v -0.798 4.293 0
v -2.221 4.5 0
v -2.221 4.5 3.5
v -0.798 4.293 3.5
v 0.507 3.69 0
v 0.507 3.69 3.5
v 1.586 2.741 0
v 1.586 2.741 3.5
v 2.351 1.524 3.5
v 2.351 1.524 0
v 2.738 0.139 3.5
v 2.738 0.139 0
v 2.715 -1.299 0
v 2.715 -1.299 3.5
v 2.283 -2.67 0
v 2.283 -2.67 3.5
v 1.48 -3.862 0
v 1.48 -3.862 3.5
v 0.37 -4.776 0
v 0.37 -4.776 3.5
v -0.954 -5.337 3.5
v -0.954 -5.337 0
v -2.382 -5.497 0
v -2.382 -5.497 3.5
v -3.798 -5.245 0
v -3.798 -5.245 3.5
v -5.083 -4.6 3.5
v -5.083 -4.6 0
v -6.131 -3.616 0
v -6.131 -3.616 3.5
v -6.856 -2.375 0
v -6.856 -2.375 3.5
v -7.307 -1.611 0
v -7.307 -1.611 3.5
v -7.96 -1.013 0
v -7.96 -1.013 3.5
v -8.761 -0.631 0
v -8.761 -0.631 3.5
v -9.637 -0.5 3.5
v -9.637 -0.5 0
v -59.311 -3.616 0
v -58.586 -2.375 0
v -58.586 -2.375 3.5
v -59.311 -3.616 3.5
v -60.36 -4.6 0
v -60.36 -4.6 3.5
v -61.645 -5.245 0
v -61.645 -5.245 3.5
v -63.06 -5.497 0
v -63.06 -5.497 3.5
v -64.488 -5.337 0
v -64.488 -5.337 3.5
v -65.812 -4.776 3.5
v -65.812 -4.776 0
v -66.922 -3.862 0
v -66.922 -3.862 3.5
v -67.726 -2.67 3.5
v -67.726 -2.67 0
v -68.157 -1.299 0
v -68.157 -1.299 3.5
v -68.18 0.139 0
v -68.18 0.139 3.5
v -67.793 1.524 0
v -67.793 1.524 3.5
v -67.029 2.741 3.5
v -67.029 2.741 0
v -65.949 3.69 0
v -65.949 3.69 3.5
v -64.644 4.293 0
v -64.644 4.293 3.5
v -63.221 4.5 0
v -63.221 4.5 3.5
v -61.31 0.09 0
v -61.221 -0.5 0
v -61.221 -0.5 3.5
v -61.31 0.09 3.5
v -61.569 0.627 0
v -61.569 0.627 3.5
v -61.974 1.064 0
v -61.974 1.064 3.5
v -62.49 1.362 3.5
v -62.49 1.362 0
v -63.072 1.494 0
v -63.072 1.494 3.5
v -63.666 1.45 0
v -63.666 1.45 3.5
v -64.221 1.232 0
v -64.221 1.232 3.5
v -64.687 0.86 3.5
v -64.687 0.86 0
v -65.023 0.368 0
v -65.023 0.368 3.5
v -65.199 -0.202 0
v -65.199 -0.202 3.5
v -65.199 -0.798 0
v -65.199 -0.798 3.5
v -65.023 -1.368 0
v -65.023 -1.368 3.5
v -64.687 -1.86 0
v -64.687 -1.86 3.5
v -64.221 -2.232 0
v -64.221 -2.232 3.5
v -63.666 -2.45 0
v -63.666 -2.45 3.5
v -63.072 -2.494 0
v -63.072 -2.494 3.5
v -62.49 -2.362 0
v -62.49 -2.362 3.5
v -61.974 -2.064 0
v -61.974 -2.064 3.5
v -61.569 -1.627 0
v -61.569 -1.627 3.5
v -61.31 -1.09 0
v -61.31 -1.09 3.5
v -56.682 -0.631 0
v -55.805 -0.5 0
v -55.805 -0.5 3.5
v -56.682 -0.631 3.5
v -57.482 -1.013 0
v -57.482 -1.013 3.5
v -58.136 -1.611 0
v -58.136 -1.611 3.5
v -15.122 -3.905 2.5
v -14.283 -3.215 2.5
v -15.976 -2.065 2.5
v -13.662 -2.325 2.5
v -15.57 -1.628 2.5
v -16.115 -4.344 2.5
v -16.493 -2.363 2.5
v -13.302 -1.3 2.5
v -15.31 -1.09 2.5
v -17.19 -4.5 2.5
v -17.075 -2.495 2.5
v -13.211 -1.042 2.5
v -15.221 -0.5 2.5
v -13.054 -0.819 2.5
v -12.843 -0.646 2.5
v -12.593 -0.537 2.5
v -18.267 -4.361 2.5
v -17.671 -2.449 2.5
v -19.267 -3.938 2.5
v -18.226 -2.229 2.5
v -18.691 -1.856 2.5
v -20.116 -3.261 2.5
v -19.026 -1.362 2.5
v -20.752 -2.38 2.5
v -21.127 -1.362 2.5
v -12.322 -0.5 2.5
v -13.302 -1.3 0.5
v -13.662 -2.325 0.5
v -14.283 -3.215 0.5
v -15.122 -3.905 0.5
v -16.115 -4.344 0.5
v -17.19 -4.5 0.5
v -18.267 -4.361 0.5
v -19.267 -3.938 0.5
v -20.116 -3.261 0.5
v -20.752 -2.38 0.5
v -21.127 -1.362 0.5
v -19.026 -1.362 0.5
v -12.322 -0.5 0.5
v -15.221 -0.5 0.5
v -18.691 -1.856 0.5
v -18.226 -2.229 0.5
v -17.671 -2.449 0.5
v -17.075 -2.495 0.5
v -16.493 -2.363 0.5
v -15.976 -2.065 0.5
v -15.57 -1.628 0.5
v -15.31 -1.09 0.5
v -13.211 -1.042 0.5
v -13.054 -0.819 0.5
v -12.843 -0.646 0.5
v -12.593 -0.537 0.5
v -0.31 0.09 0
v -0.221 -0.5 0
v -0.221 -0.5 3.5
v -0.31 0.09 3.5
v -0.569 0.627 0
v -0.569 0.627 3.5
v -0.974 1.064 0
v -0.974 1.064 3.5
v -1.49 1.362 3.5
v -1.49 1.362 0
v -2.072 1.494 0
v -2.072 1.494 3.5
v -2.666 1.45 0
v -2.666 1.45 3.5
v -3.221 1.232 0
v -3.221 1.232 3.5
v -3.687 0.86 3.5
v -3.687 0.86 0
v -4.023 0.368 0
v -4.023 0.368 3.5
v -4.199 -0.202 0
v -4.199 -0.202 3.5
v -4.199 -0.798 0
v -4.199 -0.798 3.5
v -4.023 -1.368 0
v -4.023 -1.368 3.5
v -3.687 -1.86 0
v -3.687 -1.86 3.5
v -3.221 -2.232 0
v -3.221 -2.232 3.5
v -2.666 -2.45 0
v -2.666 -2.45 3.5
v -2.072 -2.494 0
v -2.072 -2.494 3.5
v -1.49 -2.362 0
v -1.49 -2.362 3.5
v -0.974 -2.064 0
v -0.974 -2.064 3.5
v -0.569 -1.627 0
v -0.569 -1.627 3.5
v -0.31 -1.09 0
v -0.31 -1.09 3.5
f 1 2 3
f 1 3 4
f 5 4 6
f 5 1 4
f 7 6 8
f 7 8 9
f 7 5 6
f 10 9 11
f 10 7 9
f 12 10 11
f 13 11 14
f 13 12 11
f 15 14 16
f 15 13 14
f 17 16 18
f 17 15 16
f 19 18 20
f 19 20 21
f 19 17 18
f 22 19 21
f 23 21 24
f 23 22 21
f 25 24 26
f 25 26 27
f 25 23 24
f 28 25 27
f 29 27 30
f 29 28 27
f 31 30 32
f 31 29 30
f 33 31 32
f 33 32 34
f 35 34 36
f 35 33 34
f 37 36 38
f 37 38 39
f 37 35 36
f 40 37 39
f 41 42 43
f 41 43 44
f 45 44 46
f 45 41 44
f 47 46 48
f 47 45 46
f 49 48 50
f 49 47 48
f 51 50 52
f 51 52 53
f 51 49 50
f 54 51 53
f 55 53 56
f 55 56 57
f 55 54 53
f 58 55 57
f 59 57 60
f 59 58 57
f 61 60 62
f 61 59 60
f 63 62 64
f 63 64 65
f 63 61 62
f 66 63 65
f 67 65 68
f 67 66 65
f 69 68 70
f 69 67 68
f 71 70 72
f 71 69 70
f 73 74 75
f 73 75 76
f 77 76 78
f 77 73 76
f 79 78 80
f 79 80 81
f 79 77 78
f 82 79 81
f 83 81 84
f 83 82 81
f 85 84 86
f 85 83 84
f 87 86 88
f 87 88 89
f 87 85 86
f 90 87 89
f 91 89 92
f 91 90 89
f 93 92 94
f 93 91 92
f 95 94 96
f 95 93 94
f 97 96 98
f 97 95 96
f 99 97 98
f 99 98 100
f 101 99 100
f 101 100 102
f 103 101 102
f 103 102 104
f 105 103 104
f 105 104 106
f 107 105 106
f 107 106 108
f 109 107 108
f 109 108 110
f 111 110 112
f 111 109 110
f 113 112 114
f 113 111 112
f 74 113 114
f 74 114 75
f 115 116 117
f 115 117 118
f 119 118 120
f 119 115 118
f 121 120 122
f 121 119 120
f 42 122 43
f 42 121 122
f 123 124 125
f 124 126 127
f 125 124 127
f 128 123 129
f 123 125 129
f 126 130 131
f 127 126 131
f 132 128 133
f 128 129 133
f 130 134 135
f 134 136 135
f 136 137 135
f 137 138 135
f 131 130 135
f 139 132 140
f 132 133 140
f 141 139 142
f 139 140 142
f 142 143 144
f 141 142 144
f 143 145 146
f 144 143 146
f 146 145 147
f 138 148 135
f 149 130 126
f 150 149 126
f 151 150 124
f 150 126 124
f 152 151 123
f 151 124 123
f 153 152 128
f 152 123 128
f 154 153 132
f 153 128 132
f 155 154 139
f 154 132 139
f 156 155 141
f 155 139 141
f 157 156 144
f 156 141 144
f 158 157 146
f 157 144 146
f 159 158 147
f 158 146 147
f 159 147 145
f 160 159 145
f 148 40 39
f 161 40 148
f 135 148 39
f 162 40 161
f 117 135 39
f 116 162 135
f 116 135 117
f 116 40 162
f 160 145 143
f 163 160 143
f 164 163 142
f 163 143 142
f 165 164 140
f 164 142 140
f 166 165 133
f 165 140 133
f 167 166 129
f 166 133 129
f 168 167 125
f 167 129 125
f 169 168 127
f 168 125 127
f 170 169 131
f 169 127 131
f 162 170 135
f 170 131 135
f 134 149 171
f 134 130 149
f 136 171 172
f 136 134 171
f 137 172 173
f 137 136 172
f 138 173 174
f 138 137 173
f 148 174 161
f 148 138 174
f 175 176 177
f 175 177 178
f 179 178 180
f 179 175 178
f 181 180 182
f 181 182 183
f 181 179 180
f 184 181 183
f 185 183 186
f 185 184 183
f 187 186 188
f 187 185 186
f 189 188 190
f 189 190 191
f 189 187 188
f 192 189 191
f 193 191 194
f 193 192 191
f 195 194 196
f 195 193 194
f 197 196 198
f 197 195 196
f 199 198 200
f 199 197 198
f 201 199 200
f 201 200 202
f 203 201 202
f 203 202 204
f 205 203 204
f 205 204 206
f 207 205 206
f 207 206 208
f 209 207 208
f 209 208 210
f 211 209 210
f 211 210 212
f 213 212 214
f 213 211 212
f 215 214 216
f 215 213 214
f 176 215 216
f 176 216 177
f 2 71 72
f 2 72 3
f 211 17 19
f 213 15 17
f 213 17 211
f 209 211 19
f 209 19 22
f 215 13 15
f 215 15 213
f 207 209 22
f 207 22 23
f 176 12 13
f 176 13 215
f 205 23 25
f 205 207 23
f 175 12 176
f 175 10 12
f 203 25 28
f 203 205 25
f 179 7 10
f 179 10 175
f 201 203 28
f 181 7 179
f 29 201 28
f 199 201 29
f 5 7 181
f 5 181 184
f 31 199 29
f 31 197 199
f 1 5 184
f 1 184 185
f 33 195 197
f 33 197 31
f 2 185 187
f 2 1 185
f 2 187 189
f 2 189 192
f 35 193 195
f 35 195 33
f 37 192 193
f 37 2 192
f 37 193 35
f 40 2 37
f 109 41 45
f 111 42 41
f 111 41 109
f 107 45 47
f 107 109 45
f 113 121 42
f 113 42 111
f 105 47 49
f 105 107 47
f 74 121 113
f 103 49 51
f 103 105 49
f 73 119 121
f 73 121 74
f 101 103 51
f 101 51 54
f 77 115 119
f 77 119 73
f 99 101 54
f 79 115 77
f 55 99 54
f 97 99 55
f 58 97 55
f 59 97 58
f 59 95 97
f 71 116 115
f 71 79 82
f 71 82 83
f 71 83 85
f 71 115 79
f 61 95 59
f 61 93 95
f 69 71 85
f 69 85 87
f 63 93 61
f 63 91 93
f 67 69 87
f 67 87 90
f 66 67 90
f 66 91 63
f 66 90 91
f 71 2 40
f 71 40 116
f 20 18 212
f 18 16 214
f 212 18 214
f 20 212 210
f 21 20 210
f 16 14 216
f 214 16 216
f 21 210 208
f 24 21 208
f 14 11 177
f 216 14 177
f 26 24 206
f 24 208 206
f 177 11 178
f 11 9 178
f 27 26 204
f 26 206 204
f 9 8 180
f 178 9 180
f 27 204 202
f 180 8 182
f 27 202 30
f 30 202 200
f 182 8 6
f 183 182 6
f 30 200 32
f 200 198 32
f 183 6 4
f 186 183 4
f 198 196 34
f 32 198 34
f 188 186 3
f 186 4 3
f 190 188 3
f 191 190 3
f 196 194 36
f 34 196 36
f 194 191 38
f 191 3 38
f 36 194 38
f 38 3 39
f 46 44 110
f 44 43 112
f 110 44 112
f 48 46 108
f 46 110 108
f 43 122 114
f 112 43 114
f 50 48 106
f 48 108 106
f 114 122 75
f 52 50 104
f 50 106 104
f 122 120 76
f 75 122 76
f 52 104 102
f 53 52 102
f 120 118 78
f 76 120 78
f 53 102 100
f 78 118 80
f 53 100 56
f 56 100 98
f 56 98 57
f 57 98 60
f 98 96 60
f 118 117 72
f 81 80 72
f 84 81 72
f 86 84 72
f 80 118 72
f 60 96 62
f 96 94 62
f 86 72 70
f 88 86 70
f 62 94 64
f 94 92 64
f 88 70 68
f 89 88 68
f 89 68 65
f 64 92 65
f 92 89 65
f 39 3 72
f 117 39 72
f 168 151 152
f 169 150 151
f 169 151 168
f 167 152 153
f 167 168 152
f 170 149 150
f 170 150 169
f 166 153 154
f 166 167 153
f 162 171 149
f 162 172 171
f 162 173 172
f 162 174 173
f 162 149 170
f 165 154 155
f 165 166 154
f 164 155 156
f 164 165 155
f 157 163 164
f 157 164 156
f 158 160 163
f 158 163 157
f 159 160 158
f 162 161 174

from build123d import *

# Parameters (mm, degrees)
SKETCH1_R           = 2
BOSS_EXTRUDE1_DEPTH = 3.5
BOSS_EXTRUDE3_START = -1
BOSS_EXTRUDE3_DEPTH = 2
FILLET1_R           = 1


with BuildPart() as part:
    # Sketch1 → Boss-Extrude1 (new body)
    with BuildSketch(Plane.XY):
        with BuildLine():
            Line((-63.221147144, 4.5), (-2.221147144, 4.5))
            ThreePointArc((-2.221147144, 4.5), (1.924633844, -3.295084972), (-6.856271198, -2.375))
            ThreePointArc((-6.856271198, -2.375), (-7.960294648, -1.012531407), (-9.637345631, -0.5))
            Line((-9.637345631, -0.5), (-55.804948657, -0.5))
            ThreePointArc((-55.804948657, -0.5), (-57.48199964, -1.012531407), (-58.586023089, -2.375))
            ThreePointArc((-58.586023089, -2.375), (-67.366928132, -3.295084972), (-63.221147144, 4.5))
        make_face()
        with Locations((-63.221147144, -0.5)):
            Circle(SKETCH1_R, mode=Mode.SUBTRACT)
        with Locations((-2.221147144, -0.5)):
            Circle(SKETCH1_R, mode=Mode.SUBTRACT)
    extrude(amount=BOSS_EXTRUDE1_DEPTH)

    # Sketch3 → Boss-Extrude3 (add)
    with BuildSketch(Plane.XY.offset(3.5).offset(BOSS_EXTRUDE3_START)):
        with BuildLine():
            Line((-21.127237453, -1.361660316), (-19.026013205, -1.361660316))
            ThreePointArc((-19.026013205, -1.361660316), (-15.270540556, -0.058260327), (-19.221147144, -0.5))
            Line((-19.221147144, -0.5), (-21.221147144, -0.5))
            ThreePointArc((-21.221147144, -0.5), (-13.244693873, -0.066618664), (-21.127237453, -1.361660316))
        make_face()
    extrude(amount=-BOSS_EXTRUDE3_DEPTH)

    # Fillet1
    fillet1_edges = [part.edges().sort_by_distance(p)[0] for p in [
        (-13.221147144, -0.5, 1.5),
    ]]
    fillet(fillet1_edges, radius=FILLET1_R)


solid = part.part
